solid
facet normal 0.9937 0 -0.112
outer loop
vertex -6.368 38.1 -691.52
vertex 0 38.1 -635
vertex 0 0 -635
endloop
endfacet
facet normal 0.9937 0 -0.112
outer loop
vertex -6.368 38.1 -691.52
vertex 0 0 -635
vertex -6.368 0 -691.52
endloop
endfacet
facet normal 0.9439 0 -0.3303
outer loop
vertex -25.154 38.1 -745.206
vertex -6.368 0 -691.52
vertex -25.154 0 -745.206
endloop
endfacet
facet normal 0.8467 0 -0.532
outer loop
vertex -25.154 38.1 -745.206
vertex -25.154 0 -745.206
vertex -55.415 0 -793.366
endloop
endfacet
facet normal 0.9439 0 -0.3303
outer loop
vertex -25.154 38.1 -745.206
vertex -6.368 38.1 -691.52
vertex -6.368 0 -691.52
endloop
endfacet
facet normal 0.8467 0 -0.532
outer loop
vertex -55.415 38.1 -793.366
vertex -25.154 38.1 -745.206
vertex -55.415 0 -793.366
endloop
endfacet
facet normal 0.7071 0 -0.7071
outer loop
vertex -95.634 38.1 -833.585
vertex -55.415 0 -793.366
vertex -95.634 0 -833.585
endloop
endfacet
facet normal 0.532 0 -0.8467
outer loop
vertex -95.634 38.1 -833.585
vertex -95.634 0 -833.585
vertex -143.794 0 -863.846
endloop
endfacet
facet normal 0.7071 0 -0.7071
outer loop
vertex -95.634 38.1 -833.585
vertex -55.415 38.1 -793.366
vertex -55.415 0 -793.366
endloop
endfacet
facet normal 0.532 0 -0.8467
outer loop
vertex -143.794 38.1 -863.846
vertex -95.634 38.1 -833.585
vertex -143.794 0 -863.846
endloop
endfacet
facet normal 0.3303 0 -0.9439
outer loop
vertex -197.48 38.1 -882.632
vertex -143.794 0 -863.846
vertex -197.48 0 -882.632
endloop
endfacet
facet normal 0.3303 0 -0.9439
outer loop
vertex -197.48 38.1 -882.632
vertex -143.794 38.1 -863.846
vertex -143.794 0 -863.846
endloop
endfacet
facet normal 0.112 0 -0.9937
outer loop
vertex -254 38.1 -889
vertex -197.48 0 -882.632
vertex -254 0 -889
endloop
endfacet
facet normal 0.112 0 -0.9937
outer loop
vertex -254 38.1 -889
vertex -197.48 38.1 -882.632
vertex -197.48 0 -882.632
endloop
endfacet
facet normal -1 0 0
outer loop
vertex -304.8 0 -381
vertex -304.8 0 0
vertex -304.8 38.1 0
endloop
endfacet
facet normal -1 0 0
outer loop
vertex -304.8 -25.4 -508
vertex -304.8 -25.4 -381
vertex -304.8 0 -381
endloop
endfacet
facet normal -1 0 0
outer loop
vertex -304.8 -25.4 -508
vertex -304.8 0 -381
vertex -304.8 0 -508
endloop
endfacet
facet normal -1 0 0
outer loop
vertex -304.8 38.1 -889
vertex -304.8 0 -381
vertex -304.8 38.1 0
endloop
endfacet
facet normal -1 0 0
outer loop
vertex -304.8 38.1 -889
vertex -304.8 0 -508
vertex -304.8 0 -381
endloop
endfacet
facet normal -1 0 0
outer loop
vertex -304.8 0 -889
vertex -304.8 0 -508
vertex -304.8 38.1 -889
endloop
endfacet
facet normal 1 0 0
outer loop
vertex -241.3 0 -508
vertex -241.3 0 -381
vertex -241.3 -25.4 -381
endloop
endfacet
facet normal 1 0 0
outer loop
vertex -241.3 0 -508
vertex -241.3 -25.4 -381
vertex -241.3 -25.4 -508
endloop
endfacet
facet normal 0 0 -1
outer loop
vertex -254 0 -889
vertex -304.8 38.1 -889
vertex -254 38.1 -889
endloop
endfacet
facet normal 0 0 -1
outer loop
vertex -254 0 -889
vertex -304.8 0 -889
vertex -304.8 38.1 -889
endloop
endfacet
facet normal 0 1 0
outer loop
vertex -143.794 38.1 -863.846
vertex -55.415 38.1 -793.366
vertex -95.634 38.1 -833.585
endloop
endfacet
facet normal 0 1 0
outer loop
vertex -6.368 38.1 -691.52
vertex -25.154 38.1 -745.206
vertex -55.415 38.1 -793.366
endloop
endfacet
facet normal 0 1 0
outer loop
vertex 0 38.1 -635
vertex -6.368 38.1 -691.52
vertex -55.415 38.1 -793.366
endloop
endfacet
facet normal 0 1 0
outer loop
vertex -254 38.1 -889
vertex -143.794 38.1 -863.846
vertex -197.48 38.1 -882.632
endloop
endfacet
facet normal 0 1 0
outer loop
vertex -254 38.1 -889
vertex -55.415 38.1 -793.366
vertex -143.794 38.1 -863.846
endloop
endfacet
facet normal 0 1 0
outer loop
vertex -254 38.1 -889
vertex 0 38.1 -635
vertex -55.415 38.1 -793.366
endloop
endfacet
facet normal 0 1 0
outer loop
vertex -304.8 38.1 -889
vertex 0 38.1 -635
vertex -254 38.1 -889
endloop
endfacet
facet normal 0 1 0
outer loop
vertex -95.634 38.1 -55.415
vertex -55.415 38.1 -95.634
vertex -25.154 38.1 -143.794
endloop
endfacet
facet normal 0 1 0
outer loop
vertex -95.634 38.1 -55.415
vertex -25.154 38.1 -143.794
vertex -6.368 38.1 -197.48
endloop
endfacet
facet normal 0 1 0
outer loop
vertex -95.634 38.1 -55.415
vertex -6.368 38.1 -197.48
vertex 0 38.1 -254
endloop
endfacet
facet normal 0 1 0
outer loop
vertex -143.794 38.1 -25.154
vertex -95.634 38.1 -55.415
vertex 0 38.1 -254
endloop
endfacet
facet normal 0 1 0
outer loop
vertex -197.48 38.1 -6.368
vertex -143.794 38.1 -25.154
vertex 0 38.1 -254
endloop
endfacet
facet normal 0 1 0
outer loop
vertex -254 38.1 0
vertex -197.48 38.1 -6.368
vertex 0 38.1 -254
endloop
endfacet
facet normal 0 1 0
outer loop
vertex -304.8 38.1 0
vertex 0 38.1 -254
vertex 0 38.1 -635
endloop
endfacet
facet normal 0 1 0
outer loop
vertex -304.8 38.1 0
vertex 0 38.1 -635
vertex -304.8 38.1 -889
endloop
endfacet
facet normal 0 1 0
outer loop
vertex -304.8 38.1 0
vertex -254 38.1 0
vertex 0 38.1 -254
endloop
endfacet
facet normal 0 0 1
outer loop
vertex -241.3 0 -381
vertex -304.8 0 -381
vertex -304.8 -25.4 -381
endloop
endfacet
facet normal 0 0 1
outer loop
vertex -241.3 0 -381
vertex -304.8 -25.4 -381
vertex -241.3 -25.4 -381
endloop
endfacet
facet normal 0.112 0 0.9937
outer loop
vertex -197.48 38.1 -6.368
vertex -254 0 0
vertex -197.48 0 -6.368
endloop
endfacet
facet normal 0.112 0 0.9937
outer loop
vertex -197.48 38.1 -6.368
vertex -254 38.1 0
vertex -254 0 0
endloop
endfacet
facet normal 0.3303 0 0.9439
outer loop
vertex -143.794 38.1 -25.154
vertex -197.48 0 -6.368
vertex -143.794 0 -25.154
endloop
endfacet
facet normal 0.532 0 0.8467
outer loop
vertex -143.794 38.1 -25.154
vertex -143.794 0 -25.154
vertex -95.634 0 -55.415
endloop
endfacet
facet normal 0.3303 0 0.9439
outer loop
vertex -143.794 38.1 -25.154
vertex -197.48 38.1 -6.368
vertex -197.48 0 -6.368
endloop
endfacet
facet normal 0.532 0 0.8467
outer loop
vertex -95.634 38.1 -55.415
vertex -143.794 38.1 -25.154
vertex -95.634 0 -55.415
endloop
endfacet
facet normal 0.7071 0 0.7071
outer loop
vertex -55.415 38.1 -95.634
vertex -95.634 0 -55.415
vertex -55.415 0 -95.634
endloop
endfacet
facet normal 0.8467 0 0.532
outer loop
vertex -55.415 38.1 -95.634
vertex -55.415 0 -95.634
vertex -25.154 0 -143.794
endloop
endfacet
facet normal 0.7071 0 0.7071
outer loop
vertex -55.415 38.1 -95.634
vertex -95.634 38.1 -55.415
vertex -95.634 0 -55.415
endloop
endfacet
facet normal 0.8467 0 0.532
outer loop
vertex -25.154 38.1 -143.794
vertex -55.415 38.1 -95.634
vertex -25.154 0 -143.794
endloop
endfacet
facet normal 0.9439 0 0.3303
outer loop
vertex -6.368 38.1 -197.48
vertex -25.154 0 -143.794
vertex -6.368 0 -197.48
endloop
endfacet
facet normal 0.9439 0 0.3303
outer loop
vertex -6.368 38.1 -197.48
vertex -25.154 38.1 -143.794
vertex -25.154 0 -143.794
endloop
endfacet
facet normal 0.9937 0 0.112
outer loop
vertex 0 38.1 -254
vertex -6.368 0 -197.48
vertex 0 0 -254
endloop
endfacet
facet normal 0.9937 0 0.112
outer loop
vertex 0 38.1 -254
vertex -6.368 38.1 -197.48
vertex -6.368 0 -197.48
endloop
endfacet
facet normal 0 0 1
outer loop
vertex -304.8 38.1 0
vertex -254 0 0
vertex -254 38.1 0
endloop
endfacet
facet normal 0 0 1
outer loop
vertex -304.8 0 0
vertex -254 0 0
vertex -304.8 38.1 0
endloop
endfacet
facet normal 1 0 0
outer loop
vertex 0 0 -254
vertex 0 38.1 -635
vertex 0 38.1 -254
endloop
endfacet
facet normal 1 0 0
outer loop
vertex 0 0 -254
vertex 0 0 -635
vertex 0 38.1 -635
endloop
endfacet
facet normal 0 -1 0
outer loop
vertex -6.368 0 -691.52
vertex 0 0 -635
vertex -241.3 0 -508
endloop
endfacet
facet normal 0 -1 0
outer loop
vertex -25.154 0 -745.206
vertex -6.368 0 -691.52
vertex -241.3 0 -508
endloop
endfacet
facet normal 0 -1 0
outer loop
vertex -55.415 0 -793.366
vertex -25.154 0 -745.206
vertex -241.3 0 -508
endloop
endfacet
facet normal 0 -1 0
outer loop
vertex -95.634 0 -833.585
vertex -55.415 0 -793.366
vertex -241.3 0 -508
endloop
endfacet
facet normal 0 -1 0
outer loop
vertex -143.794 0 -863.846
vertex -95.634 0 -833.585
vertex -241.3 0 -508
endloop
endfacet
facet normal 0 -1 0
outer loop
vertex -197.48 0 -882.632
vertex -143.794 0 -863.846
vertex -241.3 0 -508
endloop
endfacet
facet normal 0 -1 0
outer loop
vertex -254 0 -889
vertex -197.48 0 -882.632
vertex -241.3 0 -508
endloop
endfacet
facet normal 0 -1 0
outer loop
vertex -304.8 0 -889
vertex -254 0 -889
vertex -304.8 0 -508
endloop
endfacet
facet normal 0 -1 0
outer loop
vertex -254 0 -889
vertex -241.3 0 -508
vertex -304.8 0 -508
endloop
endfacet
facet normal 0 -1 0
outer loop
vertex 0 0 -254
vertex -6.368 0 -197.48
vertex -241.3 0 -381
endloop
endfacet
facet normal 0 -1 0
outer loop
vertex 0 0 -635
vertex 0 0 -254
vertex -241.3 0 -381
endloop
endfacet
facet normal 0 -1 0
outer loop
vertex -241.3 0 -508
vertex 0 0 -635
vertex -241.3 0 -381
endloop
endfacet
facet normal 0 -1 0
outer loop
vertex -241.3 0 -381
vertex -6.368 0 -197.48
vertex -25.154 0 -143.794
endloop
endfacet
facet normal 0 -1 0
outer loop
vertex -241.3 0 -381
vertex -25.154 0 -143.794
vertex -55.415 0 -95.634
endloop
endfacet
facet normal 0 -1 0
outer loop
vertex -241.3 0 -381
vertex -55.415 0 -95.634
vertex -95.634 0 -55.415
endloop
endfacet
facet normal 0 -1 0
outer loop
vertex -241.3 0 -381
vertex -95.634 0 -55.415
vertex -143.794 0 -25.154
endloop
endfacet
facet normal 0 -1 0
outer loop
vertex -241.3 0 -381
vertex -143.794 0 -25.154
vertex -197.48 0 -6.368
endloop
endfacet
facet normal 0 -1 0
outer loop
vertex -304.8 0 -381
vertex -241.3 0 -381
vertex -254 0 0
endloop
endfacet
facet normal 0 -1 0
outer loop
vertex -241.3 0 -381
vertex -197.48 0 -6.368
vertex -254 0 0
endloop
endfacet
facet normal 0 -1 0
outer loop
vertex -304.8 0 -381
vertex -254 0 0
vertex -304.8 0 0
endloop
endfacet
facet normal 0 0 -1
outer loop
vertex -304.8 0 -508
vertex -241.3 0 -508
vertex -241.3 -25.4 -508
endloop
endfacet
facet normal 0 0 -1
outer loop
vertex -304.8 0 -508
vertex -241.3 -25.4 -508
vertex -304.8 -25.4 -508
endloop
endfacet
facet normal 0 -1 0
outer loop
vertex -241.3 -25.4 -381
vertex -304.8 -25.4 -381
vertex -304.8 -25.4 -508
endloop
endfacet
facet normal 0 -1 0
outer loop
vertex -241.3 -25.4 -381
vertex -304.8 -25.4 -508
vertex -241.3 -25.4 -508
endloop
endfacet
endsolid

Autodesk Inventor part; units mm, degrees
ref_plane "YZ Plane" through (0, 0, 0) normal (1, 0, 0) x (0, 1, 0)
ref_plane "XZ Plane" through (0, 0, 0) normal (0, 1, 0) x (-1, 0, 0)
ref_plane "XY Plane" through (0, 0, 0) normal (0, 0, 1) x (1, 0, 0)
sketch "Sketch1" plane through (0, 0, 0) normal (0, 1, 0) x (-1, 0, 0)
  line L0 (0, 0) -> (304.8, 0)
  line L1 (304.8, 0) -> (304.8, -889)
  line L2 (304.8, -889) -> (0, -889)
  line L3 (0, -889) -> (0, 0)
  dimension "d0" = 889
  dimension "d1" = 304.8
extrude "Extrusion1" add sketch "Sketch1" along normal blind 38.1
fillet "Fillet1" radius 254 1 edges at (0, 19.05, 0)
fillet "Fillet2" radius 254 1 edges at (0, 19.05, -889)
sketch "Sketch2" plane through (0, 0, 0) normal (0, -1, 0) x (1, 0, 0)
  line L0 (-254, -889) -> (-304.8, -889) projected
  line L1 (-304.8, -889) -> (-304.8, 0) projected
  line L2 (-304.8, -889) -> (-304.8, 0)
  line L3 (-304.8, 0) -> (-304.8, -381)
  line L4 (-304.8, -381) -> (-241.3, -381)
  line L5 (-241.3, -381) -> (-241.3, -508)
  line L6 (-241.3, -508) -> (-304.8, -508)
  line L7 (-304.8, -889) -> (-304.8, -508)
  line L8 (-304.8, -508) -> (-241.3, -508)
  line L9 (-241.3, -508) -> (-241.3, -381)
  line L10 (-241.3, -381) -> (-304.8, -381)
  point P0 (0, 0)
  dimension "d6" = 381
  dimension "d7" = 63.5
  dimension "d8" = 127
  dimension "d9" = 381
  dimension "d10" = 127
extrude "Extrusion2" add sketch "Sketch2" along normal blind 25.4
properties part number "Shelf-ver2-1111-2021" material "Aluminum 6061"
